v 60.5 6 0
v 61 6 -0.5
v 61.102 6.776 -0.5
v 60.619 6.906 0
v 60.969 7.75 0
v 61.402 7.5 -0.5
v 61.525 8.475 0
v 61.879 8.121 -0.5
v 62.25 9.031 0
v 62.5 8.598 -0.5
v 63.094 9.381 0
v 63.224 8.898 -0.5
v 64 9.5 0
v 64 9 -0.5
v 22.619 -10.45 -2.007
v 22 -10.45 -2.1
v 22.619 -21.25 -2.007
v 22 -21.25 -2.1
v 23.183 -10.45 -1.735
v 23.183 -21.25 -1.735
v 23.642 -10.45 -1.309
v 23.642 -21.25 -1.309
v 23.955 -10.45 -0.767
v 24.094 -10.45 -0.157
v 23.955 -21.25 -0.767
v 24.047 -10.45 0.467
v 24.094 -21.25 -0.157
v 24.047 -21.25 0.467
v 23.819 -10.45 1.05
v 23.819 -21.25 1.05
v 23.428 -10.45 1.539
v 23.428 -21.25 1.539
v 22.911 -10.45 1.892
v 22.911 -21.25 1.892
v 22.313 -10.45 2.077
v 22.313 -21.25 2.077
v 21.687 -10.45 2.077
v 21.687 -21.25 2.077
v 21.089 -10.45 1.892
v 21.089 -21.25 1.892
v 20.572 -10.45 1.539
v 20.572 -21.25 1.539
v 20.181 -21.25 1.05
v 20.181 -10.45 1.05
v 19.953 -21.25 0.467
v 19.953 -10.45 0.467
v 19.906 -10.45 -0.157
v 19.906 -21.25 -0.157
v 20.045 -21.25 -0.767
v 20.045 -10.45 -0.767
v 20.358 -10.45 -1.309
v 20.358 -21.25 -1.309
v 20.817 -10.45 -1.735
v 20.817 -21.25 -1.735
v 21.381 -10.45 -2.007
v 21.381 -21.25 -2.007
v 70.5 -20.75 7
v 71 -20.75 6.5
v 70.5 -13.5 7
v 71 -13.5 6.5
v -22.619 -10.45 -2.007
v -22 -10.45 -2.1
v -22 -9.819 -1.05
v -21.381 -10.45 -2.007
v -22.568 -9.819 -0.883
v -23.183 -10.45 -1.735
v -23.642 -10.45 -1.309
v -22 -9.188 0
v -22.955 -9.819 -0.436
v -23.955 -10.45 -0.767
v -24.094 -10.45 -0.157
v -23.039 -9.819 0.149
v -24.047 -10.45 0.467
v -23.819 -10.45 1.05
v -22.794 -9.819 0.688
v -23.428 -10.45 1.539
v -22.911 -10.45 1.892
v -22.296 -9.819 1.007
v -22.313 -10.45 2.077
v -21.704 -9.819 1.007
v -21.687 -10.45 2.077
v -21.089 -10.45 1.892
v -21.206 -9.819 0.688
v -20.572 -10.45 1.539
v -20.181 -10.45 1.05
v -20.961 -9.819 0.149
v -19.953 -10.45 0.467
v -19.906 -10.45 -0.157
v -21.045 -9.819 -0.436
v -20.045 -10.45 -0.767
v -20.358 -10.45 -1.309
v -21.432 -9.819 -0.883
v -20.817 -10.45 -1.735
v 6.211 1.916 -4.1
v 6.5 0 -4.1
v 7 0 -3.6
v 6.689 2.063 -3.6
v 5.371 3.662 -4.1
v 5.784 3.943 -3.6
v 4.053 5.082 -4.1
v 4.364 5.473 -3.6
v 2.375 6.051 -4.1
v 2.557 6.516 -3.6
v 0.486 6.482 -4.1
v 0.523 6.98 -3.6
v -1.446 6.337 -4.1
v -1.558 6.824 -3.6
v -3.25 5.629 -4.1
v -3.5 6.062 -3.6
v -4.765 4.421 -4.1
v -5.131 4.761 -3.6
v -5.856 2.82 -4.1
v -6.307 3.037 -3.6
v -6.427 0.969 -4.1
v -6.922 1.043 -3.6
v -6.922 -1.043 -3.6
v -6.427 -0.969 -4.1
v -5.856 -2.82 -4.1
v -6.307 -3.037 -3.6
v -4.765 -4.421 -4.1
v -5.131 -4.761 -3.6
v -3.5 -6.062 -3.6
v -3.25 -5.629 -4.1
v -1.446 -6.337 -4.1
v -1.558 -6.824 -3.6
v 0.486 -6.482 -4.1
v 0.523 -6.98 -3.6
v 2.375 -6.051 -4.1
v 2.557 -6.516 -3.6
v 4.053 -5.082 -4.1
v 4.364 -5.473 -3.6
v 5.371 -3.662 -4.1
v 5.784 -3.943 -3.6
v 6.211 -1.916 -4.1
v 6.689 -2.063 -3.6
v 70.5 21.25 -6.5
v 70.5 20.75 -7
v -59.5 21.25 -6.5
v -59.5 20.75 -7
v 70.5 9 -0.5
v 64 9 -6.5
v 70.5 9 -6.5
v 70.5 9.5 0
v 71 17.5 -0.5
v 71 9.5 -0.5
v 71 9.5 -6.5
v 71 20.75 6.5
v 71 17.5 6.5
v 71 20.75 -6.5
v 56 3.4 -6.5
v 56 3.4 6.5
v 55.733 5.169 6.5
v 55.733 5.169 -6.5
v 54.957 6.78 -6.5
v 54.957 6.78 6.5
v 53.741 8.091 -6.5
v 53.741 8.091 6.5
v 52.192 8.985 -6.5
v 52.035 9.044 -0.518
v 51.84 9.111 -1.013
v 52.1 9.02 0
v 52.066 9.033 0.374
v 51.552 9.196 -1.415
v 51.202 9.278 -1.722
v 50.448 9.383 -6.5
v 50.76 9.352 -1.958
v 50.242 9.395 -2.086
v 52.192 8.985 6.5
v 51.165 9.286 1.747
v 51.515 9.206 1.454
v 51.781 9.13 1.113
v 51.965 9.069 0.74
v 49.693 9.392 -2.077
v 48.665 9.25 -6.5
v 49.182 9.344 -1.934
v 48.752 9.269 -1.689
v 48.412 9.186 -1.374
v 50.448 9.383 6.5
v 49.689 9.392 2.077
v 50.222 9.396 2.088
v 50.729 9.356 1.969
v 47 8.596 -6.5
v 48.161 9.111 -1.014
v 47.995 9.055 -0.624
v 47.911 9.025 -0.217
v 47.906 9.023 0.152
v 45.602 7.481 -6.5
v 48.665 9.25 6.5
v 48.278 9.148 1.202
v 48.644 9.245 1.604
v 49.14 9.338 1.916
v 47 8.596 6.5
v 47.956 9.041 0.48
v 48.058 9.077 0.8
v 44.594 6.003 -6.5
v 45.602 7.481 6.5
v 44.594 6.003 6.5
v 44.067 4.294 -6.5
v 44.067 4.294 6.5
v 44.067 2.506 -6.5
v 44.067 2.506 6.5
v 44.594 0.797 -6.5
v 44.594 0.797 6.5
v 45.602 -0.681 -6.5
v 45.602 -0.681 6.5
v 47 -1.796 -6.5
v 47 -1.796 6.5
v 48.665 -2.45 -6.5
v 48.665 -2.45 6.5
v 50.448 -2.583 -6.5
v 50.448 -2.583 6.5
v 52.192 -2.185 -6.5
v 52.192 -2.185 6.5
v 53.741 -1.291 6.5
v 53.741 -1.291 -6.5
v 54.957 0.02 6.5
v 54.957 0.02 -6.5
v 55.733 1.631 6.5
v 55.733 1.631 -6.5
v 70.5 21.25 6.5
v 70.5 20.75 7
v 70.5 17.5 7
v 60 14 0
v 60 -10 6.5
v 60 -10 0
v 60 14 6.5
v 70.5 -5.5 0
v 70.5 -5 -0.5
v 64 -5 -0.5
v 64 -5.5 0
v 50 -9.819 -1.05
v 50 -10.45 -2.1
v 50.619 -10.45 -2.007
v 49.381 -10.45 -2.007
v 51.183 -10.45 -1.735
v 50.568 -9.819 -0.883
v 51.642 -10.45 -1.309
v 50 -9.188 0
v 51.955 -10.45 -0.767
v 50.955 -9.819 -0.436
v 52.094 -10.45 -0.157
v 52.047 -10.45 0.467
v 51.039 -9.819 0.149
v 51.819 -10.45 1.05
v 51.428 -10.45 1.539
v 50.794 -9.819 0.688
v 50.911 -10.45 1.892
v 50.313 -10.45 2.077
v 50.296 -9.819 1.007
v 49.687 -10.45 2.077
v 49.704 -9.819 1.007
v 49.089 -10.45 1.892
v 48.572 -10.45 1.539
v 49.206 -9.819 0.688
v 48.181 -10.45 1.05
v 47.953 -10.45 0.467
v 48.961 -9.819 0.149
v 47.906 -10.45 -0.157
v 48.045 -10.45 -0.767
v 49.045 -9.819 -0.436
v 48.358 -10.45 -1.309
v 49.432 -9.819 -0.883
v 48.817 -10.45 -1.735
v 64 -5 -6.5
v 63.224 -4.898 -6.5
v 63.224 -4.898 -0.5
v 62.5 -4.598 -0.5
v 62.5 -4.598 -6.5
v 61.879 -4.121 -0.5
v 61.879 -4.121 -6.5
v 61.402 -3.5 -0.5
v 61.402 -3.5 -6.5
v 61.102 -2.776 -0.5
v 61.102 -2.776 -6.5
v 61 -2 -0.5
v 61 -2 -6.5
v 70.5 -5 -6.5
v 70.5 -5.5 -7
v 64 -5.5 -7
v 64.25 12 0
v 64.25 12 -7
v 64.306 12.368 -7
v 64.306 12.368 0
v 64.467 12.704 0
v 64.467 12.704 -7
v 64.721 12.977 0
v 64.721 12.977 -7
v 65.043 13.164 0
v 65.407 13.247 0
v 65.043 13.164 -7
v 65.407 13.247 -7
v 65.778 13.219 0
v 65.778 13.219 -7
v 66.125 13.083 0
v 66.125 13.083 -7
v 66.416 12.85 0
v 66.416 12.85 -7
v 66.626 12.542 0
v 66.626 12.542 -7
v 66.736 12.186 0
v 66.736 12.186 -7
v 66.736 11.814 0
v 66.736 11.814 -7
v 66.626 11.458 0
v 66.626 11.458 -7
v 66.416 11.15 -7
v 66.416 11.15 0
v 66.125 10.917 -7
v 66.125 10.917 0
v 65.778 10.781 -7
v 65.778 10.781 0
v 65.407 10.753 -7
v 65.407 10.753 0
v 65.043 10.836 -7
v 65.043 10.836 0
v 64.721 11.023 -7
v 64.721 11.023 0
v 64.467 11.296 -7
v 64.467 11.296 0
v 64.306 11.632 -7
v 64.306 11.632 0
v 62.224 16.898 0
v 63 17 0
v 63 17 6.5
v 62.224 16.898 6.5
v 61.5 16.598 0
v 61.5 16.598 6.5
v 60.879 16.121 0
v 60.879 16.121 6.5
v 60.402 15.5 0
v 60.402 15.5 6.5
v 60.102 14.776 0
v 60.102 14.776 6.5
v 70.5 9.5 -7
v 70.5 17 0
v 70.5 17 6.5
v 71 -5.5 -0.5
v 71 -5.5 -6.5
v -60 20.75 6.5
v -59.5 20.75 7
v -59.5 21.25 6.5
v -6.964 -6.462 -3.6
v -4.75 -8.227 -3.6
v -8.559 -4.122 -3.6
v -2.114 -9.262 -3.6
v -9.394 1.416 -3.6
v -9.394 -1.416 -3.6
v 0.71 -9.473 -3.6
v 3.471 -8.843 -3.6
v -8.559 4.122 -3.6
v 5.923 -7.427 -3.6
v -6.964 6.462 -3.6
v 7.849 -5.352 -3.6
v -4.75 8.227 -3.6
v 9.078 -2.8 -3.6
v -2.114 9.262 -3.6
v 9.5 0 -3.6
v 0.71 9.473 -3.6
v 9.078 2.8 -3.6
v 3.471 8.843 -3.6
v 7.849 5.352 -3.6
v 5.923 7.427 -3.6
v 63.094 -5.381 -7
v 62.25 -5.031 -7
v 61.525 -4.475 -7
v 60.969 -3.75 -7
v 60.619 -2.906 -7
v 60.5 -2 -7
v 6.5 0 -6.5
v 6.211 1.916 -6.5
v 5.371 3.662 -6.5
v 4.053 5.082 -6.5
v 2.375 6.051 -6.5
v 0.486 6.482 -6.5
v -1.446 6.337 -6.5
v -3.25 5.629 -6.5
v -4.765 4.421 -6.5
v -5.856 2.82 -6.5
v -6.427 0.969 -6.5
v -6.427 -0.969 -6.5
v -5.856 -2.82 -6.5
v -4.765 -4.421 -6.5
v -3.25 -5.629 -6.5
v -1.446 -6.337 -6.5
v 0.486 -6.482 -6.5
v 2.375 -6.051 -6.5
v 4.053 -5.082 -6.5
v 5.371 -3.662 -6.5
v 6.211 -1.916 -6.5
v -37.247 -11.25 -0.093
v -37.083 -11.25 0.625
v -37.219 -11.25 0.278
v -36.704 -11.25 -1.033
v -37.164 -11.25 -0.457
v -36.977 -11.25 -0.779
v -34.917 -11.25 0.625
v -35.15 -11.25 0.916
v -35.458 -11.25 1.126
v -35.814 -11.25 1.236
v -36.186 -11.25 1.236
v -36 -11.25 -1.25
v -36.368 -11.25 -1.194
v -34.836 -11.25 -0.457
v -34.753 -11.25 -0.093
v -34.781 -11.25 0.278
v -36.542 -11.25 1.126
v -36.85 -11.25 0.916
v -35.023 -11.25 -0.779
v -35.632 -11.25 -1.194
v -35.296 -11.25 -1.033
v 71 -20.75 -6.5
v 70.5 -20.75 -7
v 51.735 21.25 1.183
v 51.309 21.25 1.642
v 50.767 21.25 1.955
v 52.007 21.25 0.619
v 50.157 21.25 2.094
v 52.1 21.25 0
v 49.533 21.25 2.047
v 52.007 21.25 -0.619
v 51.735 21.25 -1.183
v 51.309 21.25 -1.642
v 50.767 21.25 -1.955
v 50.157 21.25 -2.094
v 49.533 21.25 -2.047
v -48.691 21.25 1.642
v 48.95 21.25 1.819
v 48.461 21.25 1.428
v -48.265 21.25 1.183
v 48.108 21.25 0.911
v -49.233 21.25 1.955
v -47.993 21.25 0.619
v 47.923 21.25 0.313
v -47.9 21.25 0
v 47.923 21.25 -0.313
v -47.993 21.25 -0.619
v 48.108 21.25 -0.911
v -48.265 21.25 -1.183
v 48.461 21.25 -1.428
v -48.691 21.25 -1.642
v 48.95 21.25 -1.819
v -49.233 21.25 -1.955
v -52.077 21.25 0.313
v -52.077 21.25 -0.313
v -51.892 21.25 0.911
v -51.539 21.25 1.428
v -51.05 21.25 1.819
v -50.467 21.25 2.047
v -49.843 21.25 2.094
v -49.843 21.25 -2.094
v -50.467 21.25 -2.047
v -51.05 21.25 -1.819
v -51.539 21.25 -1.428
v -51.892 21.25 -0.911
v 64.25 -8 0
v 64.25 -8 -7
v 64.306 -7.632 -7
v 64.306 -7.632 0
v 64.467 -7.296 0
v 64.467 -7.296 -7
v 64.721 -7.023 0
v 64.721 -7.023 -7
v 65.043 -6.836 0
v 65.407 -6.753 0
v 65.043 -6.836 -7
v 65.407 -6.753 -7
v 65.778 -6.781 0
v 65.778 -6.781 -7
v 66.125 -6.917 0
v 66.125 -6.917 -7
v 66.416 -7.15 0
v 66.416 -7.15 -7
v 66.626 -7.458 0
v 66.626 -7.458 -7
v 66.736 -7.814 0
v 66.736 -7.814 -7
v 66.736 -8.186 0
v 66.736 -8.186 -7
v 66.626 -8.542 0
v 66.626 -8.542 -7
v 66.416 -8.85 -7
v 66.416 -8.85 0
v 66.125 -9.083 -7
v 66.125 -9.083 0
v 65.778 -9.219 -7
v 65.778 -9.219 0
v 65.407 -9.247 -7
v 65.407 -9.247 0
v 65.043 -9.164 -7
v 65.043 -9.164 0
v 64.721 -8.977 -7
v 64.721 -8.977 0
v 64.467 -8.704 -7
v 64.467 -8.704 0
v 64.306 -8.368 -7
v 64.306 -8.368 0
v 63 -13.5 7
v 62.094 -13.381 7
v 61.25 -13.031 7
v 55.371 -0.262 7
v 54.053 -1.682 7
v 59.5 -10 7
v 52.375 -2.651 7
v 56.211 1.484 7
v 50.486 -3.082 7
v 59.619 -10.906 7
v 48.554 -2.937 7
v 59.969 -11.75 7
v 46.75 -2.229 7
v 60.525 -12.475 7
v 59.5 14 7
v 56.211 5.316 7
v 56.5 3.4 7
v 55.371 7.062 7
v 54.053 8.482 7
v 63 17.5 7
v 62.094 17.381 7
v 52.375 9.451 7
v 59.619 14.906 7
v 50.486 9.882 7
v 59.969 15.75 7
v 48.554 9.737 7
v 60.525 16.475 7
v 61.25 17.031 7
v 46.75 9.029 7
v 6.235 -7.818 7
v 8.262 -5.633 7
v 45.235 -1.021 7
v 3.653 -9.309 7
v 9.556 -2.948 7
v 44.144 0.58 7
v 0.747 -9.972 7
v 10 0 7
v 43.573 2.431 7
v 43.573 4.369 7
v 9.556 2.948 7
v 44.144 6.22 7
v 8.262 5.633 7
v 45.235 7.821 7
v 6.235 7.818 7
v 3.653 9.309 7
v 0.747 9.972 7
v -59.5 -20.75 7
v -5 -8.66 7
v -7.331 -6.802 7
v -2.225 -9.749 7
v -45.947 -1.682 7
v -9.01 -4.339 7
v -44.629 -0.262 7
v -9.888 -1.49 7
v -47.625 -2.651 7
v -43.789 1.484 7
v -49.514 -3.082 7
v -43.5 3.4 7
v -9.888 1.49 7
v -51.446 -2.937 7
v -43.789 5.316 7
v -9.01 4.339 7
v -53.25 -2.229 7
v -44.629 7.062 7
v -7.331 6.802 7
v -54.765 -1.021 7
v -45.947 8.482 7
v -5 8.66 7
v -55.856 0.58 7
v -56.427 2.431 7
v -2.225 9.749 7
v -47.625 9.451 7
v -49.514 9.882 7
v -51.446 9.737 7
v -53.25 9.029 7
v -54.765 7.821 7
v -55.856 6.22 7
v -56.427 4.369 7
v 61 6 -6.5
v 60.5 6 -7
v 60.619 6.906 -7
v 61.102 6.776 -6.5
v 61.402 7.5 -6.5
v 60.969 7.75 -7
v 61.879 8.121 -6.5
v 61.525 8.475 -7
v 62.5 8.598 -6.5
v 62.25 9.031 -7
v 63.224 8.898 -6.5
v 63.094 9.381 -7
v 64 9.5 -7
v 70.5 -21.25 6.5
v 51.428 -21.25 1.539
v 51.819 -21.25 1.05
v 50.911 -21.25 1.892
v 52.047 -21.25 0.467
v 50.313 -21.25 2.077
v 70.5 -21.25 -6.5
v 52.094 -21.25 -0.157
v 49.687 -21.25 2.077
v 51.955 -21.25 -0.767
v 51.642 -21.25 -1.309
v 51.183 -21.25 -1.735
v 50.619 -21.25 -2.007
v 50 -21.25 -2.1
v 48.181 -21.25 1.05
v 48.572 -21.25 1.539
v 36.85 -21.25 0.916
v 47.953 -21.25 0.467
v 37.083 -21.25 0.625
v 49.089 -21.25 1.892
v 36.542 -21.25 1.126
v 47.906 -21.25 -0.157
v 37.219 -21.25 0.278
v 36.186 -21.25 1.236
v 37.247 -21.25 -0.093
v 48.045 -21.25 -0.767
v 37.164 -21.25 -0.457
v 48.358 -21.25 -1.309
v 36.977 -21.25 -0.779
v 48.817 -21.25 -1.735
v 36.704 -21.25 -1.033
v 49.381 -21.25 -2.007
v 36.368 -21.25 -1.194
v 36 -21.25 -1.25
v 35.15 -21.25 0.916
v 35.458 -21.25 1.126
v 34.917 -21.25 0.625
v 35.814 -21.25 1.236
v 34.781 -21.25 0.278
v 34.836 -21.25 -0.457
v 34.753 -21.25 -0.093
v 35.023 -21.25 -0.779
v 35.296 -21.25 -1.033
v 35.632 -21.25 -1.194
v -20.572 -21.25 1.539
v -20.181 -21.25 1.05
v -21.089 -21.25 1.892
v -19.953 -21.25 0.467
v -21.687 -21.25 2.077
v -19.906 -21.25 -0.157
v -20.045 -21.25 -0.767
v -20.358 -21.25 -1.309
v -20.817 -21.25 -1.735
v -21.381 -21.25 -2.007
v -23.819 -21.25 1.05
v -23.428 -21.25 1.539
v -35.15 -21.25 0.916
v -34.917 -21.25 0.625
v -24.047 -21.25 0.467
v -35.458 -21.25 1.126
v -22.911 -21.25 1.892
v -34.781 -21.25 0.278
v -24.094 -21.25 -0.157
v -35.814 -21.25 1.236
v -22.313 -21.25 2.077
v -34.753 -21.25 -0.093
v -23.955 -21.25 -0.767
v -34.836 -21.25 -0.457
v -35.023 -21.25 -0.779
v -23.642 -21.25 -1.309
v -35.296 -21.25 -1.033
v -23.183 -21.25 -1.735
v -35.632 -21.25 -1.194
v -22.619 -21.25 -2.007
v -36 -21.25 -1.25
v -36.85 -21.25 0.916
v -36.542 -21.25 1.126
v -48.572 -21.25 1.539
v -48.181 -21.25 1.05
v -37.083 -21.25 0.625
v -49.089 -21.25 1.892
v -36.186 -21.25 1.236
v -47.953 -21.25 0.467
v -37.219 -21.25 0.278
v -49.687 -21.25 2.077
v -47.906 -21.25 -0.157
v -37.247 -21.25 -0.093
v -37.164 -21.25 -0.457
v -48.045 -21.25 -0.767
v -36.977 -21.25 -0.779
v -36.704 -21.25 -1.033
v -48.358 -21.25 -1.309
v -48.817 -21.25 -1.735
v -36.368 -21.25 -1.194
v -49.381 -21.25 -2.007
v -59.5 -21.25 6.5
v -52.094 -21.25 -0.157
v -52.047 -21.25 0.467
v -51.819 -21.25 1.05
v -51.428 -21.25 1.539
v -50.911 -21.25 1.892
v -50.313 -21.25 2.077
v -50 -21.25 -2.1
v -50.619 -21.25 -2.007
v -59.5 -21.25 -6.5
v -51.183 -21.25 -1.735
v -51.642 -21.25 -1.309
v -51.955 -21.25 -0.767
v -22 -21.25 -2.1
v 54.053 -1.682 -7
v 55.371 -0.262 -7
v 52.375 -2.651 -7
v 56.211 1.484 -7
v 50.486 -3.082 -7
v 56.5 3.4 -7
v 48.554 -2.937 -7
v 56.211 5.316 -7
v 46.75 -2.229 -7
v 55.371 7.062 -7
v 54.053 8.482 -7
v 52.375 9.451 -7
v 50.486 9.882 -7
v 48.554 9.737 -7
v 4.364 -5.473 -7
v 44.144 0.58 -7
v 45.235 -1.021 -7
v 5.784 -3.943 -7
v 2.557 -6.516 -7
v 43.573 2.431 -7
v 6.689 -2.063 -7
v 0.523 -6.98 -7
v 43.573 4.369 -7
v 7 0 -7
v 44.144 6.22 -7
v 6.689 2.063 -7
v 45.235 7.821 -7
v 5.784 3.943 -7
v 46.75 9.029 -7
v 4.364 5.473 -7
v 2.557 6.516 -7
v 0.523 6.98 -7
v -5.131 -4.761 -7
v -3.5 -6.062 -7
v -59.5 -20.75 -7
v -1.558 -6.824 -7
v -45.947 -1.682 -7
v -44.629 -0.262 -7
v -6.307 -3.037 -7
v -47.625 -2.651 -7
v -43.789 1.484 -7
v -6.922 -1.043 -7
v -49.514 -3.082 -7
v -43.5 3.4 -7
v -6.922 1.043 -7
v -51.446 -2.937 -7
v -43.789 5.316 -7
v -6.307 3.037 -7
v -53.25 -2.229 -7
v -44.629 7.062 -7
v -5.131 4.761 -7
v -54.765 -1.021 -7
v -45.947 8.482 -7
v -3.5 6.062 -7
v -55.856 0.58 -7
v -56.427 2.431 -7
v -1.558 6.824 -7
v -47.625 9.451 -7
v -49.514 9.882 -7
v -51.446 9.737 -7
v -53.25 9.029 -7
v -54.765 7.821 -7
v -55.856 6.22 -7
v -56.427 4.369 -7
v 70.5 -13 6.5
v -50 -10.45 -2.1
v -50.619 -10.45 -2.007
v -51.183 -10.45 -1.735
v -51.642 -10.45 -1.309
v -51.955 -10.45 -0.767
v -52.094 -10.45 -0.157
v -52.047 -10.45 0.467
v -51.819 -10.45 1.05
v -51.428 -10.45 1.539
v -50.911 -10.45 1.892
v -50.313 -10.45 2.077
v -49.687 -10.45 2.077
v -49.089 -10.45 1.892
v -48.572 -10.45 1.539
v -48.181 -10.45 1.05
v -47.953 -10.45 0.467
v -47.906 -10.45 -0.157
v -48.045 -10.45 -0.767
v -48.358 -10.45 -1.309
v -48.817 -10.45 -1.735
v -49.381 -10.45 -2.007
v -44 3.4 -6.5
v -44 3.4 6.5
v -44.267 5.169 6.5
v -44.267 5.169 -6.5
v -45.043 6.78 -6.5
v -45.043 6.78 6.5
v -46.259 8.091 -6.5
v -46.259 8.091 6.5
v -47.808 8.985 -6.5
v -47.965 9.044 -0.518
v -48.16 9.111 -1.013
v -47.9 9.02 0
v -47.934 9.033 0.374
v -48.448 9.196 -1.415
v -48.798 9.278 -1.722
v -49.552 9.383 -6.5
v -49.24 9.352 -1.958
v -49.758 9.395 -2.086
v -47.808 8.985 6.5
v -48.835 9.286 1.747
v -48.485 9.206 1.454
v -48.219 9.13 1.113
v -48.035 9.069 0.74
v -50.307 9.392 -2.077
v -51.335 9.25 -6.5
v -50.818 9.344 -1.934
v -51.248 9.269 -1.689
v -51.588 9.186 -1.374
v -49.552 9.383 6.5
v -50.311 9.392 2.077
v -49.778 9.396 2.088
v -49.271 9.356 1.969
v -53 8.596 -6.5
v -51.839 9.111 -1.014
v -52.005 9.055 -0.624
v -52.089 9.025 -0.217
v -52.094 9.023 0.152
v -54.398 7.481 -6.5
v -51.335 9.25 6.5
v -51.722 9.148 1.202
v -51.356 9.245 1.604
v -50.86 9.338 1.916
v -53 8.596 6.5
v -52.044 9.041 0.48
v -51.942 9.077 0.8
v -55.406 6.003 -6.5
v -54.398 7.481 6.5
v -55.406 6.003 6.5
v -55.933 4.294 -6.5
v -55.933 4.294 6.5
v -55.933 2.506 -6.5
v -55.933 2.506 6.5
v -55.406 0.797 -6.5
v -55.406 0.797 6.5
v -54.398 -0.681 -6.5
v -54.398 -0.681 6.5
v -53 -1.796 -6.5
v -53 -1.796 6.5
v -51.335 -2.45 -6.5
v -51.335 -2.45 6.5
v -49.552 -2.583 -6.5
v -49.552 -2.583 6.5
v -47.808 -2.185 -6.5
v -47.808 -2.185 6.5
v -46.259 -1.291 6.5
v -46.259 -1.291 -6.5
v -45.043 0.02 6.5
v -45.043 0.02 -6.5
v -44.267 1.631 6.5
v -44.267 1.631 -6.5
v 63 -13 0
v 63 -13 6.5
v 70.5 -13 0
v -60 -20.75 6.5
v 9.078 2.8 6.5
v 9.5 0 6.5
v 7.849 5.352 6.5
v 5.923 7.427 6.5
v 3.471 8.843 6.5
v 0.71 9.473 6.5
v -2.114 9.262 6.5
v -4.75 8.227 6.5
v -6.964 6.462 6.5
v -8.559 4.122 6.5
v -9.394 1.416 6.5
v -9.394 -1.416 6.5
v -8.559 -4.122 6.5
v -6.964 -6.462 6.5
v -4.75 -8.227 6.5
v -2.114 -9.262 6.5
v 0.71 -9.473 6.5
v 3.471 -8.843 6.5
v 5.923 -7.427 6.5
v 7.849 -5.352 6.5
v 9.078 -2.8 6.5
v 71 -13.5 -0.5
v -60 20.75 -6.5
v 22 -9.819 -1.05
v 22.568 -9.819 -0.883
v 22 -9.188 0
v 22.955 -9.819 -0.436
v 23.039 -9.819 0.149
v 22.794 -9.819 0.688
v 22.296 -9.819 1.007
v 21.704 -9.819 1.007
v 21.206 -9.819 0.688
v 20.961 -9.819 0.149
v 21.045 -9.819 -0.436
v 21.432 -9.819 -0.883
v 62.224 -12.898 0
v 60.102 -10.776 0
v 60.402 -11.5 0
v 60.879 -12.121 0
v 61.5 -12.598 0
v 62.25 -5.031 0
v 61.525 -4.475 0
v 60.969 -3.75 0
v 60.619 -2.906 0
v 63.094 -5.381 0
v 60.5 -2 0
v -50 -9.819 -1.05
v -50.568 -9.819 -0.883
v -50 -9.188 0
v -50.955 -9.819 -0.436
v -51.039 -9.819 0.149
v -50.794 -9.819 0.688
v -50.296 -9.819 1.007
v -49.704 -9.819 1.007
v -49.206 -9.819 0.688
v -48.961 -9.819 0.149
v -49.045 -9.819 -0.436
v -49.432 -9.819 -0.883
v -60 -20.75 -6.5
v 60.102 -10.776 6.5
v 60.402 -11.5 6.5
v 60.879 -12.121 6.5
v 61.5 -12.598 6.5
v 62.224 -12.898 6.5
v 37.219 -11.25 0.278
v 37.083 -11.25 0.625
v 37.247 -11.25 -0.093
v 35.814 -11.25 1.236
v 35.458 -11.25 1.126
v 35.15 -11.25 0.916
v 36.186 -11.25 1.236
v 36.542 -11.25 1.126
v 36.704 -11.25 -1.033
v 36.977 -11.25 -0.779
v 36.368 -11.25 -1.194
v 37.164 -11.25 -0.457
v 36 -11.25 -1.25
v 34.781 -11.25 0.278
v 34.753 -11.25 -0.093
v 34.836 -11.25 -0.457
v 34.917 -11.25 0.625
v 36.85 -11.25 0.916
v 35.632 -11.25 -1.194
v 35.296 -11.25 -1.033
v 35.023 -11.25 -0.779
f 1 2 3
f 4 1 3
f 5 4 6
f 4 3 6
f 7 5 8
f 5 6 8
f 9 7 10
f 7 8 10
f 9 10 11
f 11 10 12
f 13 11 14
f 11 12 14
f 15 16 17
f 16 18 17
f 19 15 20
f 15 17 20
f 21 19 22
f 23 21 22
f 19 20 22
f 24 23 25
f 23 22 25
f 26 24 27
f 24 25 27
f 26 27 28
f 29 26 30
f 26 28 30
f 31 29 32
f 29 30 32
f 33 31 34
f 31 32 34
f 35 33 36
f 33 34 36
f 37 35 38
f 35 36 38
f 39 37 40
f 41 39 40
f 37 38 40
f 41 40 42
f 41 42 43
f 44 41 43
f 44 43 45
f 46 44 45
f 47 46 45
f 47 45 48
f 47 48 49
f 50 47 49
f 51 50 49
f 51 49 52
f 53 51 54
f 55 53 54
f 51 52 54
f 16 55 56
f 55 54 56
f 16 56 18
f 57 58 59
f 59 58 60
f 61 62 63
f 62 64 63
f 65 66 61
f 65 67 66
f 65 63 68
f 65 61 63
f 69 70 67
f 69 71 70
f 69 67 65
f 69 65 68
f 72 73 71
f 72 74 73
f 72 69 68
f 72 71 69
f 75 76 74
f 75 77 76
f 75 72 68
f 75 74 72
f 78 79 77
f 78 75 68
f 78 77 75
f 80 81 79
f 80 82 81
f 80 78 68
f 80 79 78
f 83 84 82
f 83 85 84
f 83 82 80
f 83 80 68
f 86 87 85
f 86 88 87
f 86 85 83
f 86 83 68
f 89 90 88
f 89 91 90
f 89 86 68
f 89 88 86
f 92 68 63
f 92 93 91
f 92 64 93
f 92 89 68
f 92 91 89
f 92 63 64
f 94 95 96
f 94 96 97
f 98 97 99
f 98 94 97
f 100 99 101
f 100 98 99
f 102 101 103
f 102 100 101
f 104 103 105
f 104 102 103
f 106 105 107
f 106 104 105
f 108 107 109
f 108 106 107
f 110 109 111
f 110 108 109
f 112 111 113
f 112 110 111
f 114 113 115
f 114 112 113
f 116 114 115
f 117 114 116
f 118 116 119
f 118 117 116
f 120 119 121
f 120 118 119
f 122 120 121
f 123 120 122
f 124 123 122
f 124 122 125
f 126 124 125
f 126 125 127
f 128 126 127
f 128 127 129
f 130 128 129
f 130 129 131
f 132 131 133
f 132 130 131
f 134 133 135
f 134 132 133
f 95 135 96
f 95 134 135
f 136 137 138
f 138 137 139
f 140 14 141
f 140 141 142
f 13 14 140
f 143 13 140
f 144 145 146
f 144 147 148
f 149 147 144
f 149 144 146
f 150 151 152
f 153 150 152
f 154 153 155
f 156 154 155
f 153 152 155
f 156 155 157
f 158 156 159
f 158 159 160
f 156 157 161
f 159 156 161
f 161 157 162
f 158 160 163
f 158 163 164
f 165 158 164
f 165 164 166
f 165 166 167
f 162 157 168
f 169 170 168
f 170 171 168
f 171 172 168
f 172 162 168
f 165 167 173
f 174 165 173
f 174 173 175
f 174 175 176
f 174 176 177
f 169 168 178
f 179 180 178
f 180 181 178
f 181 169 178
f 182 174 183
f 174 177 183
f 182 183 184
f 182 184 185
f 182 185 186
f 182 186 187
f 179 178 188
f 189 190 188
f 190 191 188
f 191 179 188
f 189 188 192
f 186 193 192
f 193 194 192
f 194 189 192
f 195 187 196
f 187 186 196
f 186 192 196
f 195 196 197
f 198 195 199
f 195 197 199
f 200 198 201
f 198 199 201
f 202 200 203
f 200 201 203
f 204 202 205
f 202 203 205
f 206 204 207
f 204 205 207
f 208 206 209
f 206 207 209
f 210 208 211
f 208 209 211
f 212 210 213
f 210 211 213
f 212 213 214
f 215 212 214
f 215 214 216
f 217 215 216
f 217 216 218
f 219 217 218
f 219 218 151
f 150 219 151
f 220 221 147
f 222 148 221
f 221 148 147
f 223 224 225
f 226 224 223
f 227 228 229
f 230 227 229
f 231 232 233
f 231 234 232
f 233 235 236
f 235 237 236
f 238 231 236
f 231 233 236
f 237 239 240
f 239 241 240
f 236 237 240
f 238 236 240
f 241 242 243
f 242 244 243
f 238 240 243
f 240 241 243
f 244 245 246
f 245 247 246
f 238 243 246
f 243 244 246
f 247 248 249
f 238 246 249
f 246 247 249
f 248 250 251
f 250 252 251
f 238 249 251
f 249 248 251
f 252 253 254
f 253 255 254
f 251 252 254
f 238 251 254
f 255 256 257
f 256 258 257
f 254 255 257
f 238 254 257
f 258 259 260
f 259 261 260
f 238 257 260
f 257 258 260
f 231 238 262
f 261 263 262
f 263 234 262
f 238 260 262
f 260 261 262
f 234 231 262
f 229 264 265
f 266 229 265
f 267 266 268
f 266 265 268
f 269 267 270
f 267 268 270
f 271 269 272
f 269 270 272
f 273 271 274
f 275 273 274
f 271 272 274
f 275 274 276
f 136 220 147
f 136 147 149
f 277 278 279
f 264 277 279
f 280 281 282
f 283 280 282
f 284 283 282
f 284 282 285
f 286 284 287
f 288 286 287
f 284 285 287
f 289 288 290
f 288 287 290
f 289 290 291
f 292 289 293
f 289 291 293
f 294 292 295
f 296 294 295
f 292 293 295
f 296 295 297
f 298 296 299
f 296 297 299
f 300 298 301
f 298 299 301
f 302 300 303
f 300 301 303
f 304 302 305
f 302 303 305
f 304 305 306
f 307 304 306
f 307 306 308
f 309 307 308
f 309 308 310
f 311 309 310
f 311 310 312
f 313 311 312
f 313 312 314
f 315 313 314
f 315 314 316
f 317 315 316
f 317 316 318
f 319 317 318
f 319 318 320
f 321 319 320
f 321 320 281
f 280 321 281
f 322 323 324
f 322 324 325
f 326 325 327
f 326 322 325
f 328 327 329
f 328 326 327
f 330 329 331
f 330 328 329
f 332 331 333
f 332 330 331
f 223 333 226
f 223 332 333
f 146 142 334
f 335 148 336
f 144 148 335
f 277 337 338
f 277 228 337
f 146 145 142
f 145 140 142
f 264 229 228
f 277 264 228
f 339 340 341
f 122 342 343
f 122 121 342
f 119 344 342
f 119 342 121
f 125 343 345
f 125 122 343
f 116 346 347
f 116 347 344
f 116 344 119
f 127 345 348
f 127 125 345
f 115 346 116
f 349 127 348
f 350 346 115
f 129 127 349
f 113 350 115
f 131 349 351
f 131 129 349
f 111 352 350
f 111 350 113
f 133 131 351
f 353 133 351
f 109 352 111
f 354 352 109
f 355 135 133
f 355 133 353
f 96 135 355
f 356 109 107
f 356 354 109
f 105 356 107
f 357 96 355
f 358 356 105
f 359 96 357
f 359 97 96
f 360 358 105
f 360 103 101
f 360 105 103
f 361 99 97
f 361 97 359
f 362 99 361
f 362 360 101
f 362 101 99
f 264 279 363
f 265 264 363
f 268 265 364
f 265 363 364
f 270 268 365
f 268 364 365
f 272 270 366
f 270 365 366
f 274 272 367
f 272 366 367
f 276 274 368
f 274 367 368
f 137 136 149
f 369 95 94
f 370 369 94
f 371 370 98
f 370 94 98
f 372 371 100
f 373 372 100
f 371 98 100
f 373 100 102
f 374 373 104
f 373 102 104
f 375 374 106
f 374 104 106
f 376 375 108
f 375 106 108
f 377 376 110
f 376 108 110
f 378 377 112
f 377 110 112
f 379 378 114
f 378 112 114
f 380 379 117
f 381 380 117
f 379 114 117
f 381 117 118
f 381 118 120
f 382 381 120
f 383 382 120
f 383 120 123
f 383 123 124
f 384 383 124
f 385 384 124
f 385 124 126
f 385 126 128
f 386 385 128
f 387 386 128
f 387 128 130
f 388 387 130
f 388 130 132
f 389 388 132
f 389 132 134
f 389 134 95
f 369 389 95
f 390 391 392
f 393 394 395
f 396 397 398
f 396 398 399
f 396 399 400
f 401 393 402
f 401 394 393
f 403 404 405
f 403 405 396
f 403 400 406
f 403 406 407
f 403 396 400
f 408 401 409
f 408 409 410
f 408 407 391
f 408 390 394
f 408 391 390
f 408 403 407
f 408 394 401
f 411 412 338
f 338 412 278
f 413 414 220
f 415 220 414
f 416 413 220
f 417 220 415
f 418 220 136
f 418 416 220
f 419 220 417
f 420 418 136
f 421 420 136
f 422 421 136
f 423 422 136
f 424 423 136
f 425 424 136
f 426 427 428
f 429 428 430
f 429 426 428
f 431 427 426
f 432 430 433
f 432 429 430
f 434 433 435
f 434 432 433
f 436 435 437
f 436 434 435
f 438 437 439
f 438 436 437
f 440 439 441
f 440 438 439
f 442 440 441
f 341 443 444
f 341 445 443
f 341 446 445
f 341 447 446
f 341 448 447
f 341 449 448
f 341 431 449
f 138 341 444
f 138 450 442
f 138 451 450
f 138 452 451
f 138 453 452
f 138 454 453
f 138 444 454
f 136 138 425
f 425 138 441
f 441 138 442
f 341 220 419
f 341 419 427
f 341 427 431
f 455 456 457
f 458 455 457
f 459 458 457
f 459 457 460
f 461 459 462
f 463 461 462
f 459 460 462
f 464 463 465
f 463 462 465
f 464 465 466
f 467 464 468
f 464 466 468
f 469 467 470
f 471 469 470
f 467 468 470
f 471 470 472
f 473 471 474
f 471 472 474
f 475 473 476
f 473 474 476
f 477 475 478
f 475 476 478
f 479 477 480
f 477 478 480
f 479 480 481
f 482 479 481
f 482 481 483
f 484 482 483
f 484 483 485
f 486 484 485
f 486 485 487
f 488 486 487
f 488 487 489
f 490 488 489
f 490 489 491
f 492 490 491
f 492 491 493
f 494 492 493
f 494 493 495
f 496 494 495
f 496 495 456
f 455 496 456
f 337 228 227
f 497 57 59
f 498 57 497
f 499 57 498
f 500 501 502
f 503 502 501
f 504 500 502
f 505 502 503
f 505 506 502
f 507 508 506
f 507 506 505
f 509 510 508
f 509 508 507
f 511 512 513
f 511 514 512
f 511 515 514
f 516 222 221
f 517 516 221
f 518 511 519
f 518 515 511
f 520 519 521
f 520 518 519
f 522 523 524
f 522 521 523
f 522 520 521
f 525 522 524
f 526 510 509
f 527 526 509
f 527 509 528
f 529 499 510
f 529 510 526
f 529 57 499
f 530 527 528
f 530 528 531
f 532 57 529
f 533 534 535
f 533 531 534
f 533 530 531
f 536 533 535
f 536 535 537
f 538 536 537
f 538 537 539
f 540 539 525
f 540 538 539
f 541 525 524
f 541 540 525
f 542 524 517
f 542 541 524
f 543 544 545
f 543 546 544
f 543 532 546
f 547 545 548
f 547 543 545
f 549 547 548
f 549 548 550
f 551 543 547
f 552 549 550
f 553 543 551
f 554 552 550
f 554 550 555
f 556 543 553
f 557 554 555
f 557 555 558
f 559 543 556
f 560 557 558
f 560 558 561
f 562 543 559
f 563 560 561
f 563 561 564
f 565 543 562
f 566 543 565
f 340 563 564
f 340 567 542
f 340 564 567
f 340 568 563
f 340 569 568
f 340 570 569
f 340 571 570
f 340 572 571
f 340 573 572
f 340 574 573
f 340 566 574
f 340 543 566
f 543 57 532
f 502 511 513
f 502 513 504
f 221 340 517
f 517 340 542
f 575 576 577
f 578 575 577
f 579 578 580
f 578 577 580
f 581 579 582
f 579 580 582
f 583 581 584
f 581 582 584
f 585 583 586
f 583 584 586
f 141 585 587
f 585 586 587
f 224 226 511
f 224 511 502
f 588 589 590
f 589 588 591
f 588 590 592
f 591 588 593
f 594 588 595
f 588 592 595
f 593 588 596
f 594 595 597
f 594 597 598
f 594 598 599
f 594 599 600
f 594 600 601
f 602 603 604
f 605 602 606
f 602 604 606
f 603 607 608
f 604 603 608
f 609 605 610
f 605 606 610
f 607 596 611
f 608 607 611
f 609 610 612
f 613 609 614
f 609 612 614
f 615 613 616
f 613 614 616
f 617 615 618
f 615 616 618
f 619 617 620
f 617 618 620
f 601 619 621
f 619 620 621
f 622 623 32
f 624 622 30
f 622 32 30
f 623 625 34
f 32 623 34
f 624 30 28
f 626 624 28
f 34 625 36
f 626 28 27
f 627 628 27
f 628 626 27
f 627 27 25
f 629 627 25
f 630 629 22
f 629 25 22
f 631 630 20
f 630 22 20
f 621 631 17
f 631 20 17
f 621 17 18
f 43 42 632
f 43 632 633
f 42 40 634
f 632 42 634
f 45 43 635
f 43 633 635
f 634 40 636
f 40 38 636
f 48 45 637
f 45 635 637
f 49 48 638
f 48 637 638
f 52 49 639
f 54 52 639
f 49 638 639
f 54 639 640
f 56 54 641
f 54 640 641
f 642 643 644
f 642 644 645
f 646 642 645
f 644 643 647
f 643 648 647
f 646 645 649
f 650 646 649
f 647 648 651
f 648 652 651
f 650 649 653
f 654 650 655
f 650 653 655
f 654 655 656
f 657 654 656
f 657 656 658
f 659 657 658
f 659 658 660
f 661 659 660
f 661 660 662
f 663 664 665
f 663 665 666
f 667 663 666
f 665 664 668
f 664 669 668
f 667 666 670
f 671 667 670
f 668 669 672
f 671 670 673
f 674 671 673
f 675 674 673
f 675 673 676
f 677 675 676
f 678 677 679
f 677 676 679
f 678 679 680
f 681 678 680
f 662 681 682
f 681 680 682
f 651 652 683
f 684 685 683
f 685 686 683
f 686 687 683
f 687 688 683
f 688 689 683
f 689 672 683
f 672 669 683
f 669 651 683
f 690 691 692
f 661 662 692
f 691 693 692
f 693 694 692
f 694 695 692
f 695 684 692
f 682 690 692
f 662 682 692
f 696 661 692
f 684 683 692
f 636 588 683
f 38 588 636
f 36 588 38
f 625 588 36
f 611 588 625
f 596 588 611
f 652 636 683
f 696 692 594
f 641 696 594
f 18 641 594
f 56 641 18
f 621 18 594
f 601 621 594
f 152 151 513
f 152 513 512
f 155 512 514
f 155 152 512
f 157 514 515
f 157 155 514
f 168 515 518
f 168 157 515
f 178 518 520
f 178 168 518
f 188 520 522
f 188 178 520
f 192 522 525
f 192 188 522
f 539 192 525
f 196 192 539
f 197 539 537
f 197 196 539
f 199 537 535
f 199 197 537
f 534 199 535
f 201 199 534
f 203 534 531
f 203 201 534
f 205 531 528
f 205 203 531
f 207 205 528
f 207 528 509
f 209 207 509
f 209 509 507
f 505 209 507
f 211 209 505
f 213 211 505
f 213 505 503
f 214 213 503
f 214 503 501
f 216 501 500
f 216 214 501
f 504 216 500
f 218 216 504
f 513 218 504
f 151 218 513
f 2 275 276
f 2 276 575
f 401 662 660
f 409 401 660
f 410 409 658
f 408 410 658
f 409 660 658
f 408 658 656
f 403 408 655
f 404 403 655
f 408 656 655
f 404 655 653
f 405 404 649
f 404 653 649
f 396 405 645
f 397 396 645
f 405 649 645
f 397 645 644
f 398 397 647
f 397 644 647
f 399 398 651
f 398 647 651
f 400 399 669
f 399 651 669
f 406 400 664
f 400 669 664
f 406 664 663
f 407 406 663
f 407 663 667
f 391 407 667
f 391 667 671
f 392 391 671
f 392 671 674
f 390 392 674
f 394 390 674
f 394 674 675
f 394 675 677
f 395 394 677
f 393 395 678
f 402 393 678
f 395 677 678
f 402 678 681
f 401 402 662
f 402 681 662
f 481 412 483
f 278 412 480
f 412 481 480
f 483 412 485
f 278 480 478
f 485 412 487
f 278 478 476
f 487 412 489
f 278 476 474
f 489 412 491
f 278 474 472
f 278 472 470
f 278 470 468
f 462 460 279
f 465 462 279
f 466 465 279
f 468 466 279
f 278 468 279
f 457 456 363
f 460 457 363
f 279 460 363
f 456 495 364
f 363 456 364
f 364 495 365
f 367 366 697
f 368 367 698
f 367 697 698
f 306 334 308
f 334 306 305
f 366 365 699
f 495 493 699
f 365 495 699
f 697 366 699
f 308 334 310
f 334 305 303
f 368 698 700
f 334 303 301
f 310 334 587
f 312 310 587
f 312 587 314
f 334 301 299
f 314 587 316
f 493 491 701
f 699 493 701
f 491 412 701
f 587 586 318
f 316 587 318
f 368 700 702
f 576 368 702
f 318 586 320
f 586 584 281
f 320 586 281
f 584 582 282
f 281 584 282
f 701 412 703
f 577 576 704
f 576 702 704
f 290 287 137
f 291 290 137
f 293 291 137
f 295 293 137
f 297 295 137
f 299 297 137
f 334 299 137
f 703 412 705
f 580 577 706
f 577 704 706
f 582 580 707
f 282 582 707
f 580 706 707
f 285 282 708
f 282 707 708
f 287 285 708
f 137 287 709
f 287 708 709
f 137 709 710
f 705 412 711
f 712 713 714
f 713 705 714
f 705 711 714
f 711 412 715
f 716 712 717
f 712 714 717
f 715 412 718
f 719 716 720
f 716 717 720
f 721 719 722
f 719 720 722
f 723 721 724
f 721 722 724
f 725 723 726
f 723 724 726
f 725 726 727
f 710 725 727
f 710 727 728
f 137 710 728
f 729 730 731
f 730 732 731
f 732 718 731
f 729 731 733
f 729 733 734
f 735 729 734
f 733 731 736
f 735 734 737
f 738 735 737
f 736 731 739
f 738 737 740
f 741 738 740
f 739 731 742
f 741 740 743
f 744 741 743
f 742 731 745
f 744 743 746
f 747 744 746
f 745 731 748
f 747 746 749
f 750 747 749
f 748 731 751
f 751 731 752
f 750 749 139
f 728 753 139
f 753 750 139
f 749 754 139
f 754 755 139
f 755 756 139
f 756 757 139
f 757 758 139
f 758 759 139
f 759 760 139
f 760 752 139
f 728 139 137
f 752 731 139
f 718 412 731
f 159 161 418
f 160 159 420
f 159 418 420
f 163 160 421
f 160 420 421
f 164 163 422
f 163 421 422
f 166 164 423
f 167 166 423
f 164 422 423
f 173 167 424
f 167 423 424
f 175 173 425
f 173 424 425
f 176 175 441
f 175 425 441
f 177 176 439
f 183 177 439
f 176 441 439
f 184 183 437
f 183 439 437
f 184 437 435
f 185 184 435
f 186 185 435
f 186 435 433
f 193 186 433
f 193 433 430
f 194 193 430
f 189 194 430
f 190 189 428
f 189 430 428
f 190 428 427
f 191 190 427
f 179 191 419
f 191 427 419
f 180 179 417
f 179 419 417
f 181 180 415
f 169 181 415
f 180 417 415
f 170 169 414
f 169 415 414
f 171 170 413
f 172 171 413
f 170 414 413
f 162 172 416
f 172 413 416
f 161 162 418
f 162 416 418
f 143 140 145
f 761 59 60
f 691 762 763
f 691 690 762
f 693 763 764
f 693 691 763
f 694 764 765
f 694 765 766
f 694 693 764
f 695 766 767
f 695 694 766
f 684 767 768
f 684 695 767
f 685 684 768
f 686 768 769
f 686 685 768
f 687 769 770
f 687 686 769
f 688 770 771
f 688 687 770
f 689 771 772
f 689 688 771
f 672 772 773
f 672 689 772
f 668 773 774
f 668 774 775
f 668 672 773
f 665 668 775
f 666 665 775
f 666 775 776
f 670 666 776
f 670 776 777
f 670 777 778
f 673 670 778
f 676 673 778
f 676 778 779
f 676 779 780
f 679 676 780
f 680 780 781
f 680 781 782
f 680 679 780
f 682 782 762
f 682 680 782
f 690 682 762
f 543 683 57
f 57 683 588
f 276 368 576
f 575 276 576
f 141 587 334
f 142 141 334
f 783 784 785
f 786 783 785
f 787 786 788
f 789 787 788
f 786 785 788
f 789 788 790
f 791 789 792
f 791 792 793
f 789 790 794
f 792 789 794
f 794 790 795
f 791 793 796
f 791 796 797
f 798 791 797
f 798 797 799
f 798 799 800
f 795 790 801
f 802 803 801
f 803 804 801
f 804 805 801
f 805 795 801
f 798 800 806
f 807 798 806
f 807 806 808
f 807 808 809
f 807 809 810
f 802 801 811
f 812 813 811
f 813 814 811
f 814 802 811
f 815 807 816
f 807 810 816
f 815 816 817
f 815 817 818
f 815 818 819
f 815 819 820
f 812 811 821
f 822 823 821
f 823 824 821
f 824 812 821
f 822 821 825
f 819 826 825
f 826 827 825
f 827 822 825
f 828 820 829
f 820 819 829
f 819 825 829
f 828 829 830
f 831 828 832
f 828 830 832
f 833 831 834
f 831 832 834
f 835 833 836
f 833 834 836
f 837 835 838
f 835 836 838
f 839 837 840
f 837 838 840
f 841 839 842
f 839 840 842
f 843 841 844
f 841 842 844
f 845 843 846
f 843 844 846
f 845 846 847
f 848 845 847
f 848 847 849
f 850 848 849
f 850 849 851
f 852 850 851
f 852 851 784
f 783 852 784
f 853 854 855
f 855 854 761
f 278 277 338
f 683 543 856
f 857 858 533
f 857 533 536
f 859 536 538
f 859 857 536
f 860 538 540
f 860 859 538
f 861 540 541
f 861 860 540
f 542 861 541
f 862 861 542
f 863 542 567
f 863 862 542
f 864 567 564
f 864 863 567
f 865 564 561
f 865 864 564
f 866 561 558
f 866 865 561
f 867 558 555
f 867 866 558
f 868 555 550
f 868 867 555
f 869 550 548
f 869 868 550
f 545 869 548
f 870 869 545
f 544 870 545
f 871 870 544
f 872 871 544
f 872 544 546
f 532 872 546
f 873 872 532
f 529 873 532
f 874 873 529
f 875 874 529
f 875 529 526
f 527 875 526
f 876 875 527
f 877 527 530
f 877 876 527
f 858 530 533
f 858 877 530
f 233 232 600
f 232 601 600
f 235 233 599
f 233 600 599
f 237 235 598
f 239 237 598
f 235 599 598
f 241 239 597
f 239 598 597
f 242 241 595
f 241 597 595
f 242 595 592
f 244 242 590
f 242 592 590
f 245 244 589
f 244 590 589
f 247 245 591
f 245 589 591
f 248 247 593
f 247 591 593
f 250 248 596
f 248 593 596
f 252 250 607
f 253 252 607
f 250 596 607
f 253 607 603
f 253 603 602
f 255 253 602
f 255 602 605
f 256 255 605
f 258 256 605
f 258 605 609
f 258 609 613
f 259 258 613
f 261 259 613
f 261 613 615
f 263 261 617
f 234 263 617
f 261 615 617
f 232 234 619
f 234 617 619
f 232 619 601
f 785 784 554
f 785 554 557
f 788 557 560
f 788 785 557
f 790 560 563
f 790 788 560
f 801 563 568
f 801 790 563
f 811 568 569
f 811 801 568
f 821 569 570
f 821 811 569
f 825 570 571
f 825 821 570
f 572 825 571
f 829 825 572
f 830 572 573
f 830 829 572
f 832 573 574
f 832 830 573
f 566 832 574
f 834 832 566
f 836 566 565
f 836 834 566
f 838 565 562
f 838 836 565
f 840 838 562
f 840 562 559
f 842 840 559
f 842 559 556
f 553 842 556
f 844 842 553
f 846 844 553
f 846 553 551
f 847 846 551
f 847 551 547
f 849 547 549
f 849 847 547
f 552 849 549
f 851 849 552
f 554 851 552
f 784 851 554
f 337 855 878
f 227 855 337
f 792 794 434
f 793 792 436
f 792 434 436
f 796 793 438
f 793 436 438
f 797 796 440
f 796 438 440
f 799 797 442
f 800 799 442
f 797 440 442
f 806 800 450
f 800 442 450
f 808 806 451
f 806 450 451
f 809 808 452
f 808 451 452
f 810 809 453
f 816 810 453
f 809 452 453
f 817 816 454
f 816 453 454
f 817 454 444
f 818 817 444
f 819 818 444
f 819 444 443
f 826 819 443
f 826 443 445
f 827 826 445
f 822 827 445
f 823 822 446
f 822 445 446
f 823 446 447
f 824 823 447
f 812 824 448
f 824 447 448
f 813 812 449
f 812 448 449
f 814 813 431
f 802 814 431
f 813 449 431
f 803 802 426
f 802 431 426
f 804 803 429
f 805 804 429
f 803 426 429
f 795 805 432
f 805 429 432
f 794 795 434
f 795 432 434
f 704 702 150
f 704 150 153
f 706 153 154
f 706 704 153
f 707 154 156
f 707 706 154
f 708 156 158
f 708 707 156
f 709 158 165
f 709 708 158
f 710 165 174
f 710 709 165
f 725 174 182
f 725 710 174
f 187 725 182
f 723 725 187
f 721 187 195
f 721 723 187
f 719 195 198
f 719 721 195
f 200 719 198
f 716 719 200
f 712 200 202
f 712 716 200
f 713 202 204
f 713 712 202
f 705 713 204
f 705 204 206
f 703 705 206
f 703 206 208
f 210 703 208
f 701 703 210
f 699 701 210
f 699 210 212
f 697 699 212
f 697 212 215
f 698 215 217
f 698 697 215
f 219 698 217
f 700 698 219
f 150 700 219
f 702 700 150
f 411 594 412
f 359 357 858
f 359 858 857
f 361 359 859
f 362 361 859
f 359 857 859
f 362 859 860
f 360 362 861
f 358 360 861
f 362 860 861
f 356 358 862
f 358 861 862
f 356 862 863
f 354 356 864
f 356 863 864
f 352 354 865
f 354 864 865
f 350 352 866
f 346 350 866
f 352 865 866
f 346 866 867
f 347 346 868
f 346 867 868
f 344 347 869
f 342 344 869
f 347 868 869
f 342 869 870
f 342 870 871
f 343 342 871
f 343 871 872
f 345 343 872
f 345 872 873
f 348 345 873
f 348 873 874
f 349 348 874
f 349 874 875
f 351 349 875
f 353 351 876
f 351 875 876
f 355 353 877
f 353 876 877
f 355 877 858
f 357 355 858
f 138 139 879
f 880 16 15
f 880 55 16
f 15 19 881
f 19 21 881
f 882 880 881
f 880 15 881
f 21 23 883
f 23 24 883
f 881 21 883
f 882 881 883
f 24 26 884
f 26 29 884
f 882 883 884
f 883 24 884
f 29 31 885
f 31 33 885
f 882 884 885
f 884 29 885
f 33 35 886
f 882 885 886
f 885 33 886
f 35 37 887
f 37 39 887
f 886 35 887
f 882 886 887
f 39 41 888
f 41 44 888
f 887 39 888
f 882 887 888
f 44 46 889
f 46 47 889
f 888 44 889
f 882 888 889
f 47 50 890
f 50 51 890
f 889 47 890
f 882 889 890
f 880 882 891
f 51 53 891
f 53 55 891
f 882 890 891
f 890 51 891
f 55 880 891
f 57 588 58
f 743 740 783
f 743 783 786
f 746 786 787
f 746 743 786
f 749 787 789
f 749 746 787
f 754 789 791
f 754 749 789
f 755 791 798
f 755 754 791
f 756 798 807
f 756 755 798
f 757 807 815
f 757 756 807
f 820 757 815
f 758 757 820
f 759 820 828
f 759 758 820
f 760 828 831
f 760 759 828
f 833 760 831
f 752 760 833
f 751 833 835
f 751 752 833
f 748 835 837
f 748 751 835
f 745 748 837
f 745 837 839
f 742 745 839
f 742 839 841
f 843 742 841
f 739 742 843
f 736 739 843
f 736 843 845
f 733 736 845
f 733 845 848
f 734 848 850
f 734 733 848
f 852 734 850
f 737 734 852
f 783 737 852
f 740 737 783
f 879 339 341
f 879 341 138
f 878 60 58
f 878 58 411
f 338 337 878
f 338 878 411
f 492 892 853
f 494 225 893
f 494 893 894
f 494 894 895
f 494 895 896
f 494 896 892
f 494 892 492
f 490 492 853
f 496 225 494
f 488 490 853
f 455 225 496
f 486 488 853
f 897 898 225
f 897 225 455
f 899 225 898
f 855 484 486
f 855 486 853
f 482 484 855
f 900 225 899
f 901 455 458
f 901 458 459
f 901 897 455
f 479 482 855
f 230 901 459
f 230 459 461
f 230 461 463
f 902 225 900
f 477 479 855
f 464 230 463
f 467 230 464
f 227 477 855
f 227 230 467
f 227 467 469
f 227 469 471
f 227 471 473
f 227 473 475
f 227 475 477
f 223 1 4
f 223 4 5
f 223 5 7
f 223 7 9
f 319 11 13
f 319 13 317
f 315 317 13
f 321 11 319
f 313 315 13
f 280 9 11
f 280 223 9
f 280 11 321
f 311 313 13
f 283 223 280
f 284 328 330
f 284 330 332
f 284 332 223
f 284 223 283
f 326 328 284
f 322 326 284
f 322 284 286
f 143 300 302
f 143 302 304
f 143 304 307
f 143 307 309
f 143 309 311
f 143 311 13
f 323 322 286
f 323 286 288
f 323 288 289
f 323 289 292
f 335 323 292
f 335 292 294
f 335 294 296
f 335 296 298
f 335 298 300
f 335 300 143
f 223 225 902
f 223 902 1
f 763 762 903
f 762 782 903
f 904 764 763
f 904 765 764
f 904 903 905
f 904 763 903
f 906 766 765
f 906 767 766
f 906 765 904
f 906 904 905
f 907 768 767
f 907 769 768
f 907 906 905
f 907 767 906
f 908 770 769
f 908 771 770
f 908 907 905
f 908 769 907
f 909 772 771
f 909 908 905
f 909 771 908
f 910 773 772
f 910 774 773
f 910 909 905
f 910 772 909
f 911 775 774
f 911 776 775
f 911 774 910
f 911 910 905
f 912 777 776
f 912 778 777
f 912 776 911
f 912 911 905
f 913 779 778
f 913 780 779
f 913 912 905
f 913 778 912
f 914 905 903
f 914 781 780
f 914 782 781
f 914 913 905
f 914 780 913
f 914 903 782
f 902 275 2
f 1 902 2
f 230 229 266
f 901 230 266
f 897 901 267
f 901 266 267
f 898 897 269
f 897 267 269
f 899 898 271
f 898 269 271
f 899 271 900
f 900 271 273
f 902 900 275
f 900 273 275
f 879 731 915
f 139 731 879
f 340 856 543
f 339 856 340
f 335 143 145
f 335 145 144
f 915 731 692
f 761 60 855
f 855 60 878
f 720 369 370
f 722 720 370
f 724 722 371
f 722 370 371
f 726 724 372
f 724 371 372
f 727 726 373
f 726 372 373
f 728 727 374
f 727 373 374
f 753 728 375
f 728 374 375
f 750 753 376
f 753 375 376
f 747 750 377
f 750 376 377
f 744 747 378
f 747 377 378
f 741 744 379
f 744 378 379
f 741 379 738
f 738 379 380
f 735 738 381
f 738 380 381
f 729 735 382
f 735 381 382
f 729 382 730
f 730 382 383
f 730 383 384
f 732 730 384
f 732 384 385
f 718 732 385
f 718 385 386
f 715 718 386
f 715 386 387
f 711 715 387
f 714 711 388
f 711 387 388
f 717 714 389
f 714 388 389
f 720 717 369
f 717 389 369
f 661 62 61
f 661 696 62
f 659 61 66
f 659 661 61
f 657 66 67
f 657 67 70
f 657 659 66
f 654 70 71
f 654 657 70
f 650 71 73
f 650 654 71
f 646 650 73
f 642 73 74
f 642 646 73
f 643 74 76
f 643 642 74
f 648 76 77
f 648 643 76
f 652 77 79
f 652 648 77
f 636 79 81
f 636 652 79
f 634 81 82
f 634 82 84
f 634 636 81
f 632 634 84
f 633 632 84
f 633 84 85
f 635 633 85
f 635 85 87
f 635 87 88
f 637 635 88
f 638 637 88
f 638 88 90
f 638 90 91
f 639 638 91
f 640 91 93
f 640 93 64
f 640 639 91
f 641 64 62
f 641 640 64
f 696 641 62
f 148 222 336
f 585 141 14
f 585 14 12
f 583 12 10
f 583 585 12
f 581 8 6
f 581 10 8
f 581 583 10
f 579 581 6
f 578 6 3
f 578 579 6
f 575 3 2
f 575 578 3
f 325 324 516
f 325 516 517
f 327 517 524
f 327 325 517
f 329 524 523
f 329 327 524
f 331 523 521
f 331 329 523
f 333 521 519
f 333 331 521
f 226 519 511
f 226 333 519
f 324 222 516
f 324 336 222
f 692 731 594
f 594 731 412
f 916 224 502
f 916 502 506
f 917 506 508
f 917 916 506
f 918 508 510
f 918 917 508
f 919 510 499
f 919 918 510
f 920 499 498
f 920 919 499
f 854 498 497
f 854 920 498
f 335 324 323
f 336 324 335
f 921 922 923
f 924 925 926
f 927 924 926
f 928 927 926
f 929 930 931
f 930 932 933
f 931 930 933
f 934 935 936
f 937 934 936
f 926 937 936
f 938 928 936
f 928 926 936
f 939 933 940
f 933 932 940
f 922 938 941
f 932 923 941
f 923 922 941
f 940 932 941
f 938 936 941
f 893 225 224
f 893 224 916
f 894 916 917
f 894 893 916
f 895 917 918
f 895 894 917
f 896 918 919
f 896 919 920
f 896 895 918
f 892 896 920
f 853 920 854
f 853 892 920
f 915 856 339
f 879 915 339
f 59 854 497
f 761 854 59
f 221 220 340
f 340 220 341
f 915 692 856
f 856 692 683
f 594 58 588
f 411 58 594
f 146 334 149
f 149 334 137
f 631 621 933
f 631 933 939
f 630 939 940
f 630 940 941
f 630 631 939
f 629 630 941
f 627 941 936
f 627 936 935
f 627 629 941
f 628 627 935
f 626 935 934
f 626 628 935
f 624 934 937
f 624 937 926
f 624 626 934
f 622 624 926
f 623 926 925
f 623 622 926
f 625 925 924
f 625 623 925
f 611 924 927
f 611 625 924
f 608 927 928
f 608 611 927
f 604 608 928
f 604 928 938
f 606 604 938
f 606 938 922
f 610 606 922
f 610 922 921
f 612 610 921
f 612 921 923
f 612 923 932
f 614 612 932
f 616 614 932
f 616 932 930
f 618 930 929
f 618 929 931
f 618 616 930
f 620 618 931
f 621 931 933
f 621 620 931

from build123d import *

# Parameters (mm, degrees)
SKETCH1_W                      = 120
SKETCH1_H                      = 42.5
BOSS_EXTRUDE1_DEPTH            = 7
SKETCH2_R                      = 9.5
CUT_EXTRUDE1_DEPTH             = 10.6
SKETCH3_R                      = 6.5
CUT_EXTRUDE2_DEPTH             = 65.528462712
SKETCH5_R                      = 6
CUT_EXTRUDE4_DEPTH             = 66.173326599
M5X0_8_TAPPED_HOLE1_AT_2_COUNT = 2
M5X0_8_TAPPED_HOLE1_AT_2_PITCH = 28
SKETCH19_R                     = 1.25
CUT_EXTRUDE7_DEPTH             = 10
M5X0_8_TAPPED_HOLE2_REACH      = 75.86
M5X0_8_TAPPED_HOLE2_BORE_R     = 2.1
SKETCH14_W                     = 14
SKETCH14_H                     = 42.5
BOSS_EXTRUDE2_DEPTH            = 11
SKETCH15_W                     = 11
SKETCH15_H                     = 30
CUT_EXTRUDE5_DEPTH             = 7
SKETCH16_W                     = 10
SKETCH16_H                     = 14
CUT_EXTRUDE6_DEPTH             = 75.441671835
FILLET1_R                      = 3
M3X0_5_TAPPED_HOLE1_D          = 2.5
CHAMFER1_SIZE                  = 0.5


with BuildPart() as part:
    # Sketch1 → Boss-Extrude1 (new, symmetric)
    with BuildSketch(Plane.XY):
        Rectangle(SKETCH1_W, SKETCH1_H)
    extrude(amount=BOSS_EXTRUDE1_DEPTH, both=True)

    # Sketch2 → Cut-Extrude1 (cut)
    with BuildSketch(Plane.XY.offset(7)):
        Circle(SKETCH2_R)
    extrude(amount=-CUT_EXTRUDE1_DEPTH, mode=Mode.SUBTRACT)

    # Sketch3 → Cut-Extrude2 (cut, through all)
    with BuildSketch(Plane.XY.offset(-3.6)):
        Circle(SKETCH3_R)
    extrude(amount=-CUT_EXTRUDE2_DEPTH, mode=Mode.SUBTRACT)

    # Sketch5 → Cut-Extrude4 (cut, through all)
    with BuildSketch(Plane.XY.offset(7)):
        with Locations((-50, 3.4)):
            Circle(SKETCH5_R)
        with Locations((50, 3.4)):
            Circle(SKETCH5_R)
    extrude(amount=-CUT_EXTRUDE4_DEPTH, mode=Mode.SUBTRACT)

    # Sketch8 → M5x0.8 Tapped Hole1 (revolve, cut)
    with BuildSketch(Plane(origin=(-22, -21.25, 0), x_dir=(0, 0, -1), z_dir=(1, 0, 0))):
        Polygon((0, 0), (0, 12.0618073), (2.1, 10.8), (2.1, 0), align=None)
    m5x0_8_tapped_hole1 = revolve(axis=Axis((-22, -27.6, 0), (0, 1, 0)), mode=Mode.SUBTRACT)

    # M5x0.8 Tapped Hole1 at 2: M5x0.8 Tapped Hole1 ×2
    with Locations(*[(-i * M5X0_8_TAPPED_HOLE1_AT_2_PITCH, 0, 0) for i in range(1, M5X0_8_TAPPED_HOLE1_AT_2_COUNT)]):
        add(m5x0_8_tapped_hole1, mode=Mode.SUBTRACT)

    # Sketch19 → Cut-Extrude7 (cut)
    with BuildSketch(Plane.XZ.offset(21.25)):
        with Locations(Location((-36, 0, 0), (0, 0, 270))):
            Circle(SKETCH19_R)
    cut_extrude7 = extrude(amount=-CUT_EXTRUDE7_DEPTH, mode=Mode.SUBTRACT)

    # Mirror1: M5x0.8 Tapped Hole1, Cut-Extrude7 across plane
    add(m5x0_8_tapped_hole1.mirror(Plane(origin=(0, 0, 0), x_dir=(0, 0, 1), z_dir=(1, 0, 0))), mode=Mode.SUBTRACT)
    add(cut_extrude7.mirror(Plane(origin=(0, 0, 0), x_dir=(0, 0, 1), z_dir=(1, 0, 0))), mode=Mode.SUBTRACT)

    # Mirror1 copy 1 sketch → Mirror1 copy 1 (revolve, cut)
    with BuildSketch(Plane(origin=(50, -21.25, 0), x_dir=(0, 0, -1), z_dir=(-1, 0, 0))):
        Polygon((0, 0), (0, -12.0618073), (2.1, -10.8), (2.1, 0), align=None)
    revolve(axis=Axis((50, -27.6, 0), (0, -1, 0)), mode=Mode.SUBTRACT)

    # M5x0.8 Tapped Hole2 bore → M5x0.8 Tapped Hole2 (cut, up to next)
    with BuildSketch(Plane(origin=(0, 21.25, 0), x_dir=(1, 0, 0), z_dir=(0, 1, 0)), mode=Mode.PRIVATE) as m5x0_8_tapped_hole2_sk1:
        with Locations((-50, 0)):
            Circle(M5X0_8_TAPPED_HOLE2_BORE_R)
    m5x0_8_tapped_hole2_tool1 = extrude(m5x0_8_tapped_hole2_sk1.sketch, amount=-M5X0_8_TAPPED_HOLE2_REACH, mode=Mode.PRIVATE) & part.part
    # M5x0.8 Tapped Hole2 bore → M5x0.8 Tapped Hole2 (cut, up to next)
    with BuildSketch(Plane(origin=(0, 21.25, 0), x_dir=(1, 0, 0), z_dir=(0, 1, 0)), mode=Mode.PRIVATE) as m5x0_8_tapped_hole2_sk2:
        with Locations((50, 0)):
            Circle(M5X0_8_TAPPED_HOLE2_BORE_R)
    m5x0_8_tapped_hole2_tool2 = extrude(m5x0_8_tapped_hole2_sk2.sketch, amount=-M5X0_8_TAPPED_HOLE2_REACH, mode=Mode.PRIVATE) & part.part
    add(m5x0_8_tapped_hole2_tool1.solids().sort_by_distance((-50, 21.25, 0))[0], mode=Mode.SUBTRACT)
    add(m5x0_8_tapped_hole2_tool2.solids().sort_by_distance((50, 21.25, 0))[0], mode=Mode.SUBTRACT)

    # Sketch14 → Boss-Extrude2 (add)
    with BuildSketch(Plane(origin=(60, 0, 0), x_dir=(0, 0, -1), z_dir=(1, 0, 0))):
        Rectangle(SKETCH14_W, SKETCH14_H)
    extrude(amount=BOSS_EXTRUDE2_DEPTH)

    # Sketch15 → Cut-Extrude5 (cut)
    with BuildSketch(Plane.XY.offset(7)):
        with Locations((65.5, 2)):
            Rectangle(SKETCH15_W, SKETCH15_H)
    extrude(amount=-CUT_EXTRUDE5_DEPTH, mode=Mode.SUBTRACT)

    # Sketch16 → Cut-Extrude6 (cut, through all)
    with BuildSketch(Plane.XY):
        with Locations((66, 2)):
            Rectangle(SKETCH16_W, SKETCH16_H)
    extrude(amount=-CUT_EXTRUDE6_DEPTH, mode=Mode.SUBTRACT)

    # Fillet1
    fillet1_edges = [part.edges().sort_by_distance(p)[0] for p in [
        (61, -5, -3.5),
        (61, 9, -3.5),
        (60, -13, 3.5),
        (60, 17, 3.5),
    ]]
    fillet(fillet1_edges, radius=FILLET1_R)

    # M3x0.5 Tapped Hole1 (through all)
    with Locations(Plane.XY):
        with Locations((65.5, 12), (65.5, -8)):
            Hole(M3X0_5_TAPPED_HOLE1_D / 2)

    # Chamfer1
    chamfer1_edges = [part.edges().sort_by_distance(p)[0] for p in [
        (-60, 0, 7),
        (71, 9, -3.5),
        (71, -5, -3.5),
        (67.5, 9, -7),
        (67.5, 9, 0),
        (67.5, -5, 0),
        (67.5, -5, -7),
        (61, 2, 0),
        (61, 2, -7),
        (67, -13, 7),
        (60, 2, 7),
        (61.878679656, -4.121320344, 0),
        (61.878679656, -4.121320344, -7),
        (60.878679656, -12.121320344, 7),
        (60.878679656, 16.121320344, 7),
        (61.878679656, 8.121320344, 0),
        (61.878679656, 8.121320344, -7),
        (5.5, -21.25, 7),
        (-9.5, 0, 7),
        (-6.5, 0, -7),
        (-6.5, 0, -3.6),
        (-56, 3.4, -7),
        (-56, 3.4, 7),
        (44, 3.4, -7),
        (44, 3.4, 7),
        (5.5, -21.25, -7),
        (-60, 0, -7),
        (5.5, 21.25, -7),
        (5.5, 21.25, 7),
        (71, 19.125, 7),
        (71, -21.25, 0),
        (71, -13.125, -7),
        (71, 21.25, 0),
        (-60, -21.25, 0),
        (-60, 21.25, 0),
        (71, -17.125, 7),
        (71, -9, 0),
        (71, 17, 3.5),
        (71, -13, 3.5),
        (67, 17, 7),
        (71, 13, 0),
        (71, 15.125, -7),
    ]]
    chamfer(chamfer1_edges, length=CHAMFER1_SIZE)


solid = part.part
